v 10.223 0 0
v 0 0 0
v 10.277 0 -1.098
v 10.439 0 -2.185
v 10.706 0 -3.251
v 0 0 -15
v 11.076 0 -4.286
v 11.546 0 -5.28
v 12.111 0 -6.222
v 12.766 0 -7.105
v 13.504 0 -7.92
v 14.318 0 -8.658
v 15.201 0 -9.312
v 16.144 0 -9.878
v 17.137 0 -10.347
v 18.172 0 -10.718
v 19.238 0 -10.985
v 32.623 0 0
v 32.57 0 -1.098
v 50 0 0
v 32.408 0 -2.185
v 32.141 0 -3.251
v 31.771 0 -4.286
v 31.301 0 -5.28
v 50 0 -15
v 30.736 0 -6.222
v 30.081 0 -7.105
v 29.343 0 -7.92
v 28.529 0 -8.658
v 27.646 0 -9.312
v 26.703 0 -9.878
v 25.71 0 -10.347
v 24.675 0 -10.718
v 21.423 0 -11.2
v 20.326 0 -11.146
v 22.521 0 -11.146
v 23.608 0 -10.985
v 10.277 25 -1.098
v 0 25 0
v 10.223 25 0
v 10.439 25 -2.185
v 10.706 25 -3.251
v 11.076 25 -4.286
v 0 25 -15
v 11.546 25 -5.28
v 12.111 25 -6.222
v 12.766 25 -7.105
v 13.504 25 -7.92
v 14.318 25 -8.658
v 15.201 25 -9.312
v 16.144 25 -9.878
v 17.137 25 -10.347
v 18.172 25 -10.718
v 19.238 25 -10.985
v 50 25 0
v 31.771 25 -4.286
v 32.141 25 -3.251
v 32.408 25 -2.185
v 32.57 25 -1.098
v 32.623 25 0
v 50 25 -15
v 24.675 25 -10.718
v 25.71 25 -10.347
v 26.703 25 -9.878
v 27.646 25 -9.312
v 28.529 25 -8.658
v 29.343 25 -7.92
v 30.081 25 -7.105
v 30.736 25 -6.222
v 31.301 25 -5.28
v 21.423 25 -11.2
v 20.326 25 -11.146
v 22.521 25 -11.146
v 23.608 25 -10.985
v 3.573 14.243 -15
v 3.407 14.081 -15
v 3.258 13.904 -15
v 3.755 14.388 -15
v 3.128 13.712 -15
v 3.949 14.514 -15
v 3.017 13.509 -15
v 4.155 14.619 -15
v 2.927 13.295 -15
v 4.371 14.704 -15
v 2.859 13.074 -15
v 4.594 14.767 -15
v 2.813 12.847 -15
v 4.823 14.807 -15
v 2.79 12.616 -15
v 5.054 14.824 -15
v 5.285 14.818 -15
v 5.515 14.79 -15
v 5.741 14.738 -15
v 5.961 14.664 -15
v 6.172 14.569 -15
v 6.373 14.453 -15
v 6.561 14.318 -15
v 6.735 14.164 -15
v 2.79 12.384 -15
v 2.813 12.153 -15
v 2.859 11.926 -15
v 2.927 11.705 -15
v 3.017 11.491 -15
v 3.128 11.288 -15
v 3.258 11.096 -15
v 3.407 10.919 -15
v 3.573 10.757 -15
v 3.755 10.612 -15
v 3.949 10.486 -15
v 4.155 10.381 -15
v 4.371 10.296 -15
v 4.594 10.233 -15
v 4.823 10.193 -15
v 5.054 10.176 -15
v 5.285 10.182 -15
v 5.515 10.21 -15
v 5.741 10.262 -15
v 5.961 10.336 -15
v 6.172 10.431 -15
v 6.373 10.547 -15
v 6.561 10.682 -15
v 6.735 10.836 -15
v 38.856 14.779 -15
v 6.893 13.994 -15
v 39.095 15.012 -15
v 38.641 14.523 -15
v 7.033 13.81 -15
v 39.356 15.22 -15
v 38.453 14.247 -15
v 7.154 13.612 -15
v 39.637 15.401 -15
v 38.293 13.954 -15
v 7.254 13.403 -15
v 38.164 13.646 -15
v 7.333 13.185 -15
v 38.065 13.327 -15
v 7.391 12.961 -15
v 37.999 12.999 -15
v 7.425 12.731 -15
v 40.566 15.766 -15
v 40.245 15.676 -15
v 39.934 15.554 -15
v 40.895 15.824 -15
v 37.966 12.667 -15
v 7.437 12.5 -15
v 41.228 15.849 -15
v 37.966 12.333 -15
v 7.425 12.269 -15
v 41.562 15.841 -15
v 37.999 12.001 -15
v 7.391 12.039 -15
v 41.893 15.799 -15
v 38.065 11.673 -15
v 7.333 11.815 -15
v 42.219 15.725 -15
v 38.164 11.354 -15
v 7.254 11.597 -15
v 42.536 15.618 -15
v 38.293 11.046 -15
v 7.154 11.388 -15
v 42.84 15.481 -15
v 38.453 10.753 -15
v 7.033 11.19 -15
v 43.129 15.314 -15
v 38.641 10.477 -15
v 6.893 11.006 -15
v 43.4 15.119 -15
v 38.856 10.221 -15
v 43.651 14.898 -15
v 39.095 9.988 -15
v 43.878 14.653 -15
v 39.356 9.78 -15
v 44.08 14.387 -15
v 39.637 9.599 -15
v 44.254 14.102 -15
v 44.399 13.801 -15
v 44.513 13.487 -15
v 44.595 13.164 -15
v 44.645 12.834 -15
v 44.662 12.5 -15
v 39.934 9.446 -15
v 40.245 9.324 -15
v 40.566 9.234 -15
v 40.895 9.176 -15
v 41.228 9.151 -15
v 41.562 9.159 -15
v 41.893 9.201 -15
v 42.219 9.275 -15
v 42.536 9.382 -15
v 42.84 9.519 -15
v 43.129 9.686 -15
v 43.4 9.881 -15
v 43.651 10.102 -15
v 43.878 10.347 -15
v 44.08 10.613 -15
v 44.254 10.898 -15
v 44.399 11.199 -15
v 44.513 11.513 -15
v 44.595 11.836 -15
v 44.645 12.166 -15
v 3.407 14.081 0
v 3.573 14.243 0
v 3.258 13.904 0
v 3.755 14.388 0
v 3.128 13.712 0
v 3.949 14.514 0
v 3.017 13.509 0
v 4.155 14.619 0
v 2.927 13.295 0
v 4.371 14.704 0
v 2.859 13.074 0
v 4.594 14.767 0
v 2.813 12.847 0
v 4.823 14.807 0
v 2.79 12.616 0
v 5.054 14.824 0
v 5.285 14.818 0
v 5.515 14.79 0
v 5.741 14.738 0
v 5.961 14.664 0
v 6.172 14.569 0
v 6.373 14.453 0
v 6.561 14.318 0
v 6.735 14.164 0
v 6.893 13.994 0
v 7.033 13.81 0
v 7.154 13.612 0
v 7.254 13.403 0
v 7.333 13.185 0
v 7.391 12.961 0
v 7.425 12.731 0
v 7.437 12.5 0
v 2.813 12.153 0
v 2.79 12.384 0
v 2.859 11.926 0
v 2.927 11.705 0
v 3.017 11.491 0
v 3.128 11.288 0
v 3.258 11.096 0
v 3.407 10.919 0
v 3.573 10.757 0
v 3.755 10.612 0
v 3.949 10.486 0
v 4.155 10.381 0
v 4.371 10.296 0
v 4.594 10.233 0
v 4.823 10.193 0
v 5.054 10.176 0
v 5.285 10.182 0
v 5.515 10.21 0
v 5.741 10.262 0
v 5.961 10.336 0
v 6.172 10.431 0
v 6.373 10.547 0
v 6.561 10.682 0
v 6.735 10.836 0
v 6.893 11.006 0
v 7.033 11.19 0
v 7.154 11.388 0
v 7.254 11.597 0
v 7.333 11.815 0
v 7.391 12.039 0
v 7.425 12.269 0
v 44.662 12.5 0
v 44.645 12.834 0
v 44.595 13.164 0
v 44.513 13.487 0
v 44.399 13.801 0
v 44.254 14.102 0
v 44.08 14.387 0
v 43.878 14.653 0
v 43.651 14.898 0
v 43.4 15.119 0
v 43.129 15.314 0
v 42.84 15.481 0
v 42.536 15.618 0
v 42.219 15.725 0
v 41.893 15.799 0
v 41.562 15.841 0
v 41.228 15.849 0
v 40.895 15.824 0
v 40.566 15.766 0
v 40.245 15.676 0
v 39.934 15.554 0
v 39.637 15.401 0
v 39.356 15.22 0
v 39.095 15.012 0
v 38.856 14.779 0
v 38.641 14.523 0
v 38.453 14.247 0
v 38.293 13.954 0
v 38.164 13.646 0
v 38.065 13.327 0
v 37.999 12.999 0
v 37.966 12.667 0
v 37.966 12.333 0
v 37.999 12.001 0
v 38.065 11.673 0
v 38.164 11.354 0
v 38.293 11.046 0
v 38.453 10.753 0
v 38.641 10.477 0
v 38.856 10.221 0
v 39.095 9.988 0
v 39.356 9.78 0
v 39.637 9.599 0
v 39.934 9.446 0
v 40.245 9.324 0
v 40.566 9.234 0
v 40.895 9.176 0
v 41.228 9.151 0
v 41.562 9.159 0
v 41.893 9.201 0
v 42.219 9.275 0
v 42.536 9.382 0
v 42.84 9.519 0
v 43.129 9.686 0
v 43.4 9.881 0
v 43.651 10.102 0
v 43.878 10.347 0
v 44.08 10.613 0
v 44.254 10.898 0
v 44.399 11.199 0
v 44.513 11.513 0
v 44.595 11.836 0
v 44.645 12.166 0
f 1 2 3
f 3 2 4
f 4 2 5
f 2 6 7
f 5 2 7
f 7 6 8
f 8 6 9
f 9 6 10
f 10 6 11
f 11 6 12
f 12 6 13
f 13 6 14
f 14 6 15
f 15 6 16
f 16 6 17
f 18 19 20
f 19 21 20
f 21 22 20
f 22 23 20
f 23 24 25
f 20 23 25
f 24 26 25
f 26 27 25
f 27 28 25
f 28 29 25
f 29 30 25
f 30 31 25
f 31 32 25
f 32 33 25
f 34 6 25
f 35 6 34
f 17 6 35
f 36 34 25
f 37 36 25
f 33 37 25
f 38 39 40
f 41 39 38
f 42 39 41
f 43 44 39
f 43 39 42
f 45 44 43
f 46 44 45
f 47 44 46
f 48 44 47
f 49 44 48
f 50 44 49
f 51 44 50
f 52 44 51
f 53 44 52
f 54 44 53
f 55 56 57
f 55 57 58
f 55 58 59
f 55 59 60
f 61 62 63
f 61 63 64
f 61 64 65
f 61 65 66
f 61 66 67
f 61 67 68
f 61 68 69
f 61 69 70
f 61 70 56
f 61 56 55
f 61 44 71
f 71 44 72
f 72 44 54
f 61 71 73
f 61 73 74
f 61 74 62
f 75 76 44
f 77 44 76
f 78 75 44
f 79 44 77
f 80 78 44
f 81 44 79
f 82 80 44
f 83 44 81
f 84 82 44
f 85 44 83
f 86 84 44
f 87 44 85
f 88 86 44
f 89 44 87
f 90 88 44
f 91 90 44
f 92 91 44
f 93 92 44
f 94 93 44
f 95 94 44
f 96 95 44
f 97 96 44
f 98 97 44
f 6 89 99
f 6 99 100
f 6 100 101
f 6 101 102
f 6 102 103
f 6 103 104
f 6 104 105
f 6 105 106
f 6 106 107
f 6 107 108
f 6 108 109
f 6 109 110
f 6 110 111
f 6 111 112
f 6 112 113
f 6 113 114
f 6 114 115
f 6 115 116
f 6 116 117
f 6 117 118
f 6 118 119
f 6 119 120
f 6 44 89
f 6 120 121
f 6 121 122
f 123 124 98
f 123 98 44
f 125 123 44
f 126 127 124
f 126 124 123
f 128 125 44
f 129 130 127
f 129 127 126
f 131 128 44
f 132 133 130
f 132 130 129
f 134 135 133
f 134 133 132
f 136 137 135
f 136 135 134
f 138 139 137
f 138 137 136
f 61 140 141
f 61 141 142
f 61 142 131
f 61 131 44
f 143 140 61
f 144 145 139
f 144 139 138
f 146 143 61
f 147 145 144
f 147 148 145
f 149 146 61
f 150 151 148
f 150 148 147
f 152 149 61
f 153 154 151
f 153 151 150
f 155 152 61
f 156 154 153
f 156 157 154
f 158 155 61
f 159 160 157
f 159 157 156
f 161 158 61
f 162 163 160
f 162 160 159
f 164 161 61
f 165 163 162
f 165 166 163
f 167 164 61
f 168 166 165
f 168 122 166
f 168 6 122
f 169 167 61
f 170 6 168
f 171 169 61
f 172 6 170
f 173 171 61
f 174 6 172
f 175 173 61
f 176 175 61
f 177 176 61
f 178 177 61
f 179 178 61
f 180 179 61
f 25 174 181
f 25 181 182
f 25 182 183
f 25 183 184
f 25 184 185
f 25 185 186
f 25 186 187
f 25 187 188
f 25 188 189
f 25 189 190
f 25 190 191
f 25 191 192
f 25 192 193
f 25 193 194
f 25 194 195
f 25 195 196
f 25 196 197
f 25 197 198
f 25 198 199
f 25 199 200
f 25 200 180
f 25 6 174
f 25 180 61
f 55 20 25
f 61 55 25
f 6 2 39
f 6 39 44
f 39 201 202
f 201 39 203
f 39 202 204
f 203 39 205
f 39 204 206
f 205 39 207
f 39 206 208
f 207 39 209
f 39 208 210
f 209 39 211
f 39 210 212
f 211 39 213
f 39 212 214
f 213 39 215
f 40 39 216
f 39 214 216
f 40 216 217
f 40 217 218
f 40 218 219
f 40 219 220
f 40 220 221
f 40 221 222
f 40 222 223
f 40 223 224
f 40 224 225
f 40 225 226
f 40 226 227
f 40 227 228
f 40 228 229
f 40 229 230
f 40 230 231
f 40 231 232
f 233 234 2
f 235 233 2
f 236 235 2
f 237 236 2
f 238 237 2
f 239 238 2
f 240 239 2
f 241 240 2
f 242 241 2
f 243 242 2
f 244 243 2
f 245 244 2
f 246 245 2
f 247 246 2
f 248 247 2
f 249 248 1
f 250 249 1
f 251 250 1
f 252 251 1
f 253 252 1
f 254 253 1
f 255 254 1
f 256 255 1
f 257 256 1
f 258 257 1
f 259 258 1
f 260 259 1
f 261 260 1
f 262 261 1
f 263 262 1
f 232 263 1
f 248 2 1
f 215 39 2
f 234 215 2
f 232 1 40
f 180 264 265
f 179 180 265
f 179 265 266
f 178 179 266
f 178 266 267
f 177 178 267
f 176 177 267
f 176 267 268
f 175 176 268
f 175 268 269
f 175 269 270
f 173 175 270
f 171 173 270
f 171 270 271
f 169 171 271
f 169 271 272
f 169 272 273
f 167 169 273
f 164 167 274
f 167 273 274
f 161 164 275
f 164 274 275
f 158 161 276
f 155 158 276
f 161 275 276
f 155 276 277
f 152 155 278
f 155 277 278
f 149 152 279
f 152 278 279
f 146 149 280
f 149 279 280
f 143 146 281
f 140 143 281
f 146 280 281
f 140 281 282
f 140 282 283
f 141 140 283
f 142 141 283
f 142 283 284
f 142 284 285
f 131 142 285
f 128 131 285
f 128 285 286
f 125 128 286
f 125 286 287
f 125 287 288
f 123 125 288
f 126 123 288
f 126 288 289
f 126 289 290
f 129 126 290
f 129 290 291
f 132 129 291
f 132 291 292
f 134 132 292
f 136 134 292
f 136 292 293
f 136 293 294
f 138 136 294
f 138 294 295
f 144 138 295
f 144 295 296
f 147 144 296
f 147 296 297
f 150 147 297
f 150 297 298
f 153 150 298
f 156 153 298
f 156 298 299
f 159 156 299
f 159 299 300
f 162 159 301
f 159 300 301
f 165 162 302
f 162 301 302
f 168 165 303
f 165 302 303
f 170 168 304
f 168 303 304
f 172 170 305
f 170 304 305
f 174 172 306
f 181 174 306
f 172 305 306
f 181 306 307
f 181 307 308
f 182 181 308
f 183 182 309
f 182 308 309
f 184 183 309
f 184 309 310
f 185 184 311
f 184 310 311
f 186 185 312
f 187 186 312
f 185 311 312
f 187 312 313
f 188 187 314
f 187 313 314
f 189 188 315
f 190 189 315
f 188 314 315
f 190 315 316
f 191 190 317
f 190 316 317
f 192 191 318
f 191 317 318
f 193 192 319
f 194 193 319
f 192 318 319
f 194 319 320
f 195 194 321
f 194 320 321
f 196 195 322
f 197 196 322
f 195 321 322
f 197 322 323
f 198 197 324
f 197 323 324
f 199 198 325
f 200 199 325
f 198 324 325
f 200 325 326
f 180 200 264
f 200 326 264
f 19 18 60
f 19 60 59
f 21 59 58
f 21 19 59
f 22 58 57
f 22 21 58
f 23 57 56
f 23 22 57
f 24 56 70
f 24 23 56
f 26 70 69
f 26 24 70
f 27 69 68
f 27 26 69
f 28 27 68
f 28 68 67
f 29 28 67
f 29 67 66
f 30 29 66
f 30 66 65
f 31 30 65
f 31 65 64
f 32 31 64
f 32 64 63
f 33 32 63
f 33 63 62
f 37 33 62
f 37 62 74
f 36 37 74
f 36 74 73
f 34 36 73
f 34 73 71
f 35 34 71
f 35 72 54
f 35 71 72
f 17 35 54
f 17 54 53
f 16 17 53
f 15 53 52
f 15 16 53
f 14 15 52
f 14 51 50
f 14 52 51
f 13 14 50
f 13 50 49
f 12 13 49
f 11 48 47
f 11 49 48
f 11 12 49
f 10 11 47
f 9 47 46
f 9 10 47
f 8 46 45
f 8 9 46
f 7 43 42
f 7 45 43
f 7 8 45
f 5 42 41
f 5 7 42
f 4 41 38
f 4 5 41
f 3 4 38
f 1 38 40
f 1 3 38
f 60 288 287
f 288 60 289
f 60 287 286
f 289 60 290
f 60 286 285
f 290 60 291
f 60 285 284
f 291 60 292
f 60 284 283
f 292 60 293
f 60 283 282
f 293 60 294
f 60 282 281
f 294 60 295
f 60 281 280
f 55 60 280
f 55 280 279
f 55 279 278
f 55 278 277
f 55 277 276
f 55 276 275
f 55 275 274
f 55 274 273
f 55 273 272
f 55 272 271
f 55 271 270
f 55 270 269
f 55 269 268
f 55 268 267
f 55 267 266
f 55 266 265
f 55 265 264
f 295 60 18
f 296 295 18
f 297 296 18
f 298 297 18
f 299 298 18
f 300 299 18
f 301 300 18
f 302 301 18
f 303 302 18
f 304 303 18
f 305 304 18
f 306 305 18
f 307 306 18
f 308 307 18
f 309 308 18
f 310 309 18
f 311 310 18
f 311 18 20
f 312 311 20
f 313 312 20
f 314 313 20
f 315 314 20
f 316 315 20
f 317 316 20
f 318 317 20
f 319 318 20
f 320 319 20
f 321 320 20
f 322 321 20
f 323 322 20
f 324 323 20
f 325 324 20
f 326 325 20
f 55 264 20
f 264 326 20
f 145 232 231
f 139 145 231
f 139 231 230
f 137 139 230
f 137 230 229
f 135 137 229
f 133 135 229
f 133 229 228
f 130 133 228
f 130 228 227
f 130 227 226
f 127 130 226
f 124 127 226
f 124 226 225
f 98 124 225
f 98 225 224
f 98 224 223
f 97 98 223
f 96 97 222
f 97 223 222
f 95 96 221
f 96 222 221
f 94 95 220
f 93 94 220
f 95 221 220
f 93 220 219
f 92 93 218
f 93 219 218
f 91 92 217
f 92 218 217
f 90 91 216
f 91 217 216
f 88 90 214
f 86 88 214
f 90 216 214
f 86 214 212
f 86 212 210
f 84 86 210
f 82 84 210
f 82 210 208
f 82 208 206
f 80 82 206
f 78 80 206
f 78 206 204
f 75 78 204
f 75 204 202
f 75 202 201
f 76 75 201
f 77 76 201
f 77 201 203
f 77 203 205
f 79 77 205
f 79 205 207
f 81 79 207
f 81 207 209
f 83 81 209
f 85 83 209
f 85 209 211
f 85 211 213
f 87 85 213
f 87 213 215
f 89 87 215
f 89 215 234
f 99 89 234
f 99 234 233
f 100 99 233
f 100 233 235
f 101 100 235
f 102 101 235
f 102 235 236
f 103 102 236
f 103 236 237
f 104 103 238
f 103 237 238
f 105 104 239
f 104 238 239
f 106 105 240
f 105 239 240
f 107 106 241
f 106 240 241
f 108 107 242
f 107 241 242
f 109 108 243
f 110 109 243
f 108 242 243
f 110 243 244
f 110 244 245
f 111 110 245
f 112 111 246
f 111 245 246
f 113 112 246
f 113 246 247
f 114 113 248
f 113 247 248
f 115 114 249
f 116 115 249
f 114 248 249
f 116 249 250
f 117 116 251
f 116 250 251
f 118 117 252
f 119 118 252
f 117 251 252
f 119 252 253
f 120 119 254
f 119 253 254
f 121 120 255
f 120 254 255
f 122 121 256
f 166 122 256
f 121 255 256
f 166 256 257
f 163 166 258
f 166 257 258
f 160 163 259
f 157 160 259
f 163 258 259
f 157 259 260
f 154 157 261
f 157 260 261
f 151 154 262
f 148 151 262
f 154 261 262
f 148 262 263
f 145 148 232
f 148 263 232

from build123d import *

# Parameters (mm, degrees)
SKETCH1_W           = 50
SKETCH1_H           = 15
BOSS_EXTRUDE1_DEPTH = 25
SKETCH4_R           = 11.2
CUT_EXTRUDE3_DEPTH  = 58.879184514
SKETCH5_R           = 2.325
SKETCH5_R_2         = 3.35
CUT_EXTRUDE4_DEPTH  = 58.879184514


with BuildPart() as part:
    # Sketch1 → Boss-Extrude1 (new body)
    with BuildSketch(Plane(origin=(0, 0, 0), x_dir=(1, 0, 0), z_dir=(0, 1, 0))):
        with Locations((25, 7.5)):
            Rectangle(SKETCH1_W, SKETCH1_H)
    extrude(amount=BOSS_EXTRUDE1_DEPTH)

    # Sketch4 → Cut-Extrude3 (cut, through all)
    with BuildSketch(Plane(origin=(0, 0, 0), x_dir=(1, 0, 0), z_dir=(0, 1, 0))):
        with Locations((21.42346, 0)):
            Circle(SKETCH4_R)
    extrude(amount=CUT_EXTRUDE3_DEPTH, mode=Mode.SUBTRACT)

    # Sketch5 → Cut-Extrude4 (cut, through all)
    with BuildSketch(Plane.XY):
        with Locations((5.11173, 12.5)):
            Circle(SKETCH5_R)
        with Locations((41.31173, 12.5)):
            Circle(SKETCH5_R_2)
    extrude(amount=-CUT_EXTRUDE4_DEPTH, mode=Mode.SUBTRACT)


solid = part.part
